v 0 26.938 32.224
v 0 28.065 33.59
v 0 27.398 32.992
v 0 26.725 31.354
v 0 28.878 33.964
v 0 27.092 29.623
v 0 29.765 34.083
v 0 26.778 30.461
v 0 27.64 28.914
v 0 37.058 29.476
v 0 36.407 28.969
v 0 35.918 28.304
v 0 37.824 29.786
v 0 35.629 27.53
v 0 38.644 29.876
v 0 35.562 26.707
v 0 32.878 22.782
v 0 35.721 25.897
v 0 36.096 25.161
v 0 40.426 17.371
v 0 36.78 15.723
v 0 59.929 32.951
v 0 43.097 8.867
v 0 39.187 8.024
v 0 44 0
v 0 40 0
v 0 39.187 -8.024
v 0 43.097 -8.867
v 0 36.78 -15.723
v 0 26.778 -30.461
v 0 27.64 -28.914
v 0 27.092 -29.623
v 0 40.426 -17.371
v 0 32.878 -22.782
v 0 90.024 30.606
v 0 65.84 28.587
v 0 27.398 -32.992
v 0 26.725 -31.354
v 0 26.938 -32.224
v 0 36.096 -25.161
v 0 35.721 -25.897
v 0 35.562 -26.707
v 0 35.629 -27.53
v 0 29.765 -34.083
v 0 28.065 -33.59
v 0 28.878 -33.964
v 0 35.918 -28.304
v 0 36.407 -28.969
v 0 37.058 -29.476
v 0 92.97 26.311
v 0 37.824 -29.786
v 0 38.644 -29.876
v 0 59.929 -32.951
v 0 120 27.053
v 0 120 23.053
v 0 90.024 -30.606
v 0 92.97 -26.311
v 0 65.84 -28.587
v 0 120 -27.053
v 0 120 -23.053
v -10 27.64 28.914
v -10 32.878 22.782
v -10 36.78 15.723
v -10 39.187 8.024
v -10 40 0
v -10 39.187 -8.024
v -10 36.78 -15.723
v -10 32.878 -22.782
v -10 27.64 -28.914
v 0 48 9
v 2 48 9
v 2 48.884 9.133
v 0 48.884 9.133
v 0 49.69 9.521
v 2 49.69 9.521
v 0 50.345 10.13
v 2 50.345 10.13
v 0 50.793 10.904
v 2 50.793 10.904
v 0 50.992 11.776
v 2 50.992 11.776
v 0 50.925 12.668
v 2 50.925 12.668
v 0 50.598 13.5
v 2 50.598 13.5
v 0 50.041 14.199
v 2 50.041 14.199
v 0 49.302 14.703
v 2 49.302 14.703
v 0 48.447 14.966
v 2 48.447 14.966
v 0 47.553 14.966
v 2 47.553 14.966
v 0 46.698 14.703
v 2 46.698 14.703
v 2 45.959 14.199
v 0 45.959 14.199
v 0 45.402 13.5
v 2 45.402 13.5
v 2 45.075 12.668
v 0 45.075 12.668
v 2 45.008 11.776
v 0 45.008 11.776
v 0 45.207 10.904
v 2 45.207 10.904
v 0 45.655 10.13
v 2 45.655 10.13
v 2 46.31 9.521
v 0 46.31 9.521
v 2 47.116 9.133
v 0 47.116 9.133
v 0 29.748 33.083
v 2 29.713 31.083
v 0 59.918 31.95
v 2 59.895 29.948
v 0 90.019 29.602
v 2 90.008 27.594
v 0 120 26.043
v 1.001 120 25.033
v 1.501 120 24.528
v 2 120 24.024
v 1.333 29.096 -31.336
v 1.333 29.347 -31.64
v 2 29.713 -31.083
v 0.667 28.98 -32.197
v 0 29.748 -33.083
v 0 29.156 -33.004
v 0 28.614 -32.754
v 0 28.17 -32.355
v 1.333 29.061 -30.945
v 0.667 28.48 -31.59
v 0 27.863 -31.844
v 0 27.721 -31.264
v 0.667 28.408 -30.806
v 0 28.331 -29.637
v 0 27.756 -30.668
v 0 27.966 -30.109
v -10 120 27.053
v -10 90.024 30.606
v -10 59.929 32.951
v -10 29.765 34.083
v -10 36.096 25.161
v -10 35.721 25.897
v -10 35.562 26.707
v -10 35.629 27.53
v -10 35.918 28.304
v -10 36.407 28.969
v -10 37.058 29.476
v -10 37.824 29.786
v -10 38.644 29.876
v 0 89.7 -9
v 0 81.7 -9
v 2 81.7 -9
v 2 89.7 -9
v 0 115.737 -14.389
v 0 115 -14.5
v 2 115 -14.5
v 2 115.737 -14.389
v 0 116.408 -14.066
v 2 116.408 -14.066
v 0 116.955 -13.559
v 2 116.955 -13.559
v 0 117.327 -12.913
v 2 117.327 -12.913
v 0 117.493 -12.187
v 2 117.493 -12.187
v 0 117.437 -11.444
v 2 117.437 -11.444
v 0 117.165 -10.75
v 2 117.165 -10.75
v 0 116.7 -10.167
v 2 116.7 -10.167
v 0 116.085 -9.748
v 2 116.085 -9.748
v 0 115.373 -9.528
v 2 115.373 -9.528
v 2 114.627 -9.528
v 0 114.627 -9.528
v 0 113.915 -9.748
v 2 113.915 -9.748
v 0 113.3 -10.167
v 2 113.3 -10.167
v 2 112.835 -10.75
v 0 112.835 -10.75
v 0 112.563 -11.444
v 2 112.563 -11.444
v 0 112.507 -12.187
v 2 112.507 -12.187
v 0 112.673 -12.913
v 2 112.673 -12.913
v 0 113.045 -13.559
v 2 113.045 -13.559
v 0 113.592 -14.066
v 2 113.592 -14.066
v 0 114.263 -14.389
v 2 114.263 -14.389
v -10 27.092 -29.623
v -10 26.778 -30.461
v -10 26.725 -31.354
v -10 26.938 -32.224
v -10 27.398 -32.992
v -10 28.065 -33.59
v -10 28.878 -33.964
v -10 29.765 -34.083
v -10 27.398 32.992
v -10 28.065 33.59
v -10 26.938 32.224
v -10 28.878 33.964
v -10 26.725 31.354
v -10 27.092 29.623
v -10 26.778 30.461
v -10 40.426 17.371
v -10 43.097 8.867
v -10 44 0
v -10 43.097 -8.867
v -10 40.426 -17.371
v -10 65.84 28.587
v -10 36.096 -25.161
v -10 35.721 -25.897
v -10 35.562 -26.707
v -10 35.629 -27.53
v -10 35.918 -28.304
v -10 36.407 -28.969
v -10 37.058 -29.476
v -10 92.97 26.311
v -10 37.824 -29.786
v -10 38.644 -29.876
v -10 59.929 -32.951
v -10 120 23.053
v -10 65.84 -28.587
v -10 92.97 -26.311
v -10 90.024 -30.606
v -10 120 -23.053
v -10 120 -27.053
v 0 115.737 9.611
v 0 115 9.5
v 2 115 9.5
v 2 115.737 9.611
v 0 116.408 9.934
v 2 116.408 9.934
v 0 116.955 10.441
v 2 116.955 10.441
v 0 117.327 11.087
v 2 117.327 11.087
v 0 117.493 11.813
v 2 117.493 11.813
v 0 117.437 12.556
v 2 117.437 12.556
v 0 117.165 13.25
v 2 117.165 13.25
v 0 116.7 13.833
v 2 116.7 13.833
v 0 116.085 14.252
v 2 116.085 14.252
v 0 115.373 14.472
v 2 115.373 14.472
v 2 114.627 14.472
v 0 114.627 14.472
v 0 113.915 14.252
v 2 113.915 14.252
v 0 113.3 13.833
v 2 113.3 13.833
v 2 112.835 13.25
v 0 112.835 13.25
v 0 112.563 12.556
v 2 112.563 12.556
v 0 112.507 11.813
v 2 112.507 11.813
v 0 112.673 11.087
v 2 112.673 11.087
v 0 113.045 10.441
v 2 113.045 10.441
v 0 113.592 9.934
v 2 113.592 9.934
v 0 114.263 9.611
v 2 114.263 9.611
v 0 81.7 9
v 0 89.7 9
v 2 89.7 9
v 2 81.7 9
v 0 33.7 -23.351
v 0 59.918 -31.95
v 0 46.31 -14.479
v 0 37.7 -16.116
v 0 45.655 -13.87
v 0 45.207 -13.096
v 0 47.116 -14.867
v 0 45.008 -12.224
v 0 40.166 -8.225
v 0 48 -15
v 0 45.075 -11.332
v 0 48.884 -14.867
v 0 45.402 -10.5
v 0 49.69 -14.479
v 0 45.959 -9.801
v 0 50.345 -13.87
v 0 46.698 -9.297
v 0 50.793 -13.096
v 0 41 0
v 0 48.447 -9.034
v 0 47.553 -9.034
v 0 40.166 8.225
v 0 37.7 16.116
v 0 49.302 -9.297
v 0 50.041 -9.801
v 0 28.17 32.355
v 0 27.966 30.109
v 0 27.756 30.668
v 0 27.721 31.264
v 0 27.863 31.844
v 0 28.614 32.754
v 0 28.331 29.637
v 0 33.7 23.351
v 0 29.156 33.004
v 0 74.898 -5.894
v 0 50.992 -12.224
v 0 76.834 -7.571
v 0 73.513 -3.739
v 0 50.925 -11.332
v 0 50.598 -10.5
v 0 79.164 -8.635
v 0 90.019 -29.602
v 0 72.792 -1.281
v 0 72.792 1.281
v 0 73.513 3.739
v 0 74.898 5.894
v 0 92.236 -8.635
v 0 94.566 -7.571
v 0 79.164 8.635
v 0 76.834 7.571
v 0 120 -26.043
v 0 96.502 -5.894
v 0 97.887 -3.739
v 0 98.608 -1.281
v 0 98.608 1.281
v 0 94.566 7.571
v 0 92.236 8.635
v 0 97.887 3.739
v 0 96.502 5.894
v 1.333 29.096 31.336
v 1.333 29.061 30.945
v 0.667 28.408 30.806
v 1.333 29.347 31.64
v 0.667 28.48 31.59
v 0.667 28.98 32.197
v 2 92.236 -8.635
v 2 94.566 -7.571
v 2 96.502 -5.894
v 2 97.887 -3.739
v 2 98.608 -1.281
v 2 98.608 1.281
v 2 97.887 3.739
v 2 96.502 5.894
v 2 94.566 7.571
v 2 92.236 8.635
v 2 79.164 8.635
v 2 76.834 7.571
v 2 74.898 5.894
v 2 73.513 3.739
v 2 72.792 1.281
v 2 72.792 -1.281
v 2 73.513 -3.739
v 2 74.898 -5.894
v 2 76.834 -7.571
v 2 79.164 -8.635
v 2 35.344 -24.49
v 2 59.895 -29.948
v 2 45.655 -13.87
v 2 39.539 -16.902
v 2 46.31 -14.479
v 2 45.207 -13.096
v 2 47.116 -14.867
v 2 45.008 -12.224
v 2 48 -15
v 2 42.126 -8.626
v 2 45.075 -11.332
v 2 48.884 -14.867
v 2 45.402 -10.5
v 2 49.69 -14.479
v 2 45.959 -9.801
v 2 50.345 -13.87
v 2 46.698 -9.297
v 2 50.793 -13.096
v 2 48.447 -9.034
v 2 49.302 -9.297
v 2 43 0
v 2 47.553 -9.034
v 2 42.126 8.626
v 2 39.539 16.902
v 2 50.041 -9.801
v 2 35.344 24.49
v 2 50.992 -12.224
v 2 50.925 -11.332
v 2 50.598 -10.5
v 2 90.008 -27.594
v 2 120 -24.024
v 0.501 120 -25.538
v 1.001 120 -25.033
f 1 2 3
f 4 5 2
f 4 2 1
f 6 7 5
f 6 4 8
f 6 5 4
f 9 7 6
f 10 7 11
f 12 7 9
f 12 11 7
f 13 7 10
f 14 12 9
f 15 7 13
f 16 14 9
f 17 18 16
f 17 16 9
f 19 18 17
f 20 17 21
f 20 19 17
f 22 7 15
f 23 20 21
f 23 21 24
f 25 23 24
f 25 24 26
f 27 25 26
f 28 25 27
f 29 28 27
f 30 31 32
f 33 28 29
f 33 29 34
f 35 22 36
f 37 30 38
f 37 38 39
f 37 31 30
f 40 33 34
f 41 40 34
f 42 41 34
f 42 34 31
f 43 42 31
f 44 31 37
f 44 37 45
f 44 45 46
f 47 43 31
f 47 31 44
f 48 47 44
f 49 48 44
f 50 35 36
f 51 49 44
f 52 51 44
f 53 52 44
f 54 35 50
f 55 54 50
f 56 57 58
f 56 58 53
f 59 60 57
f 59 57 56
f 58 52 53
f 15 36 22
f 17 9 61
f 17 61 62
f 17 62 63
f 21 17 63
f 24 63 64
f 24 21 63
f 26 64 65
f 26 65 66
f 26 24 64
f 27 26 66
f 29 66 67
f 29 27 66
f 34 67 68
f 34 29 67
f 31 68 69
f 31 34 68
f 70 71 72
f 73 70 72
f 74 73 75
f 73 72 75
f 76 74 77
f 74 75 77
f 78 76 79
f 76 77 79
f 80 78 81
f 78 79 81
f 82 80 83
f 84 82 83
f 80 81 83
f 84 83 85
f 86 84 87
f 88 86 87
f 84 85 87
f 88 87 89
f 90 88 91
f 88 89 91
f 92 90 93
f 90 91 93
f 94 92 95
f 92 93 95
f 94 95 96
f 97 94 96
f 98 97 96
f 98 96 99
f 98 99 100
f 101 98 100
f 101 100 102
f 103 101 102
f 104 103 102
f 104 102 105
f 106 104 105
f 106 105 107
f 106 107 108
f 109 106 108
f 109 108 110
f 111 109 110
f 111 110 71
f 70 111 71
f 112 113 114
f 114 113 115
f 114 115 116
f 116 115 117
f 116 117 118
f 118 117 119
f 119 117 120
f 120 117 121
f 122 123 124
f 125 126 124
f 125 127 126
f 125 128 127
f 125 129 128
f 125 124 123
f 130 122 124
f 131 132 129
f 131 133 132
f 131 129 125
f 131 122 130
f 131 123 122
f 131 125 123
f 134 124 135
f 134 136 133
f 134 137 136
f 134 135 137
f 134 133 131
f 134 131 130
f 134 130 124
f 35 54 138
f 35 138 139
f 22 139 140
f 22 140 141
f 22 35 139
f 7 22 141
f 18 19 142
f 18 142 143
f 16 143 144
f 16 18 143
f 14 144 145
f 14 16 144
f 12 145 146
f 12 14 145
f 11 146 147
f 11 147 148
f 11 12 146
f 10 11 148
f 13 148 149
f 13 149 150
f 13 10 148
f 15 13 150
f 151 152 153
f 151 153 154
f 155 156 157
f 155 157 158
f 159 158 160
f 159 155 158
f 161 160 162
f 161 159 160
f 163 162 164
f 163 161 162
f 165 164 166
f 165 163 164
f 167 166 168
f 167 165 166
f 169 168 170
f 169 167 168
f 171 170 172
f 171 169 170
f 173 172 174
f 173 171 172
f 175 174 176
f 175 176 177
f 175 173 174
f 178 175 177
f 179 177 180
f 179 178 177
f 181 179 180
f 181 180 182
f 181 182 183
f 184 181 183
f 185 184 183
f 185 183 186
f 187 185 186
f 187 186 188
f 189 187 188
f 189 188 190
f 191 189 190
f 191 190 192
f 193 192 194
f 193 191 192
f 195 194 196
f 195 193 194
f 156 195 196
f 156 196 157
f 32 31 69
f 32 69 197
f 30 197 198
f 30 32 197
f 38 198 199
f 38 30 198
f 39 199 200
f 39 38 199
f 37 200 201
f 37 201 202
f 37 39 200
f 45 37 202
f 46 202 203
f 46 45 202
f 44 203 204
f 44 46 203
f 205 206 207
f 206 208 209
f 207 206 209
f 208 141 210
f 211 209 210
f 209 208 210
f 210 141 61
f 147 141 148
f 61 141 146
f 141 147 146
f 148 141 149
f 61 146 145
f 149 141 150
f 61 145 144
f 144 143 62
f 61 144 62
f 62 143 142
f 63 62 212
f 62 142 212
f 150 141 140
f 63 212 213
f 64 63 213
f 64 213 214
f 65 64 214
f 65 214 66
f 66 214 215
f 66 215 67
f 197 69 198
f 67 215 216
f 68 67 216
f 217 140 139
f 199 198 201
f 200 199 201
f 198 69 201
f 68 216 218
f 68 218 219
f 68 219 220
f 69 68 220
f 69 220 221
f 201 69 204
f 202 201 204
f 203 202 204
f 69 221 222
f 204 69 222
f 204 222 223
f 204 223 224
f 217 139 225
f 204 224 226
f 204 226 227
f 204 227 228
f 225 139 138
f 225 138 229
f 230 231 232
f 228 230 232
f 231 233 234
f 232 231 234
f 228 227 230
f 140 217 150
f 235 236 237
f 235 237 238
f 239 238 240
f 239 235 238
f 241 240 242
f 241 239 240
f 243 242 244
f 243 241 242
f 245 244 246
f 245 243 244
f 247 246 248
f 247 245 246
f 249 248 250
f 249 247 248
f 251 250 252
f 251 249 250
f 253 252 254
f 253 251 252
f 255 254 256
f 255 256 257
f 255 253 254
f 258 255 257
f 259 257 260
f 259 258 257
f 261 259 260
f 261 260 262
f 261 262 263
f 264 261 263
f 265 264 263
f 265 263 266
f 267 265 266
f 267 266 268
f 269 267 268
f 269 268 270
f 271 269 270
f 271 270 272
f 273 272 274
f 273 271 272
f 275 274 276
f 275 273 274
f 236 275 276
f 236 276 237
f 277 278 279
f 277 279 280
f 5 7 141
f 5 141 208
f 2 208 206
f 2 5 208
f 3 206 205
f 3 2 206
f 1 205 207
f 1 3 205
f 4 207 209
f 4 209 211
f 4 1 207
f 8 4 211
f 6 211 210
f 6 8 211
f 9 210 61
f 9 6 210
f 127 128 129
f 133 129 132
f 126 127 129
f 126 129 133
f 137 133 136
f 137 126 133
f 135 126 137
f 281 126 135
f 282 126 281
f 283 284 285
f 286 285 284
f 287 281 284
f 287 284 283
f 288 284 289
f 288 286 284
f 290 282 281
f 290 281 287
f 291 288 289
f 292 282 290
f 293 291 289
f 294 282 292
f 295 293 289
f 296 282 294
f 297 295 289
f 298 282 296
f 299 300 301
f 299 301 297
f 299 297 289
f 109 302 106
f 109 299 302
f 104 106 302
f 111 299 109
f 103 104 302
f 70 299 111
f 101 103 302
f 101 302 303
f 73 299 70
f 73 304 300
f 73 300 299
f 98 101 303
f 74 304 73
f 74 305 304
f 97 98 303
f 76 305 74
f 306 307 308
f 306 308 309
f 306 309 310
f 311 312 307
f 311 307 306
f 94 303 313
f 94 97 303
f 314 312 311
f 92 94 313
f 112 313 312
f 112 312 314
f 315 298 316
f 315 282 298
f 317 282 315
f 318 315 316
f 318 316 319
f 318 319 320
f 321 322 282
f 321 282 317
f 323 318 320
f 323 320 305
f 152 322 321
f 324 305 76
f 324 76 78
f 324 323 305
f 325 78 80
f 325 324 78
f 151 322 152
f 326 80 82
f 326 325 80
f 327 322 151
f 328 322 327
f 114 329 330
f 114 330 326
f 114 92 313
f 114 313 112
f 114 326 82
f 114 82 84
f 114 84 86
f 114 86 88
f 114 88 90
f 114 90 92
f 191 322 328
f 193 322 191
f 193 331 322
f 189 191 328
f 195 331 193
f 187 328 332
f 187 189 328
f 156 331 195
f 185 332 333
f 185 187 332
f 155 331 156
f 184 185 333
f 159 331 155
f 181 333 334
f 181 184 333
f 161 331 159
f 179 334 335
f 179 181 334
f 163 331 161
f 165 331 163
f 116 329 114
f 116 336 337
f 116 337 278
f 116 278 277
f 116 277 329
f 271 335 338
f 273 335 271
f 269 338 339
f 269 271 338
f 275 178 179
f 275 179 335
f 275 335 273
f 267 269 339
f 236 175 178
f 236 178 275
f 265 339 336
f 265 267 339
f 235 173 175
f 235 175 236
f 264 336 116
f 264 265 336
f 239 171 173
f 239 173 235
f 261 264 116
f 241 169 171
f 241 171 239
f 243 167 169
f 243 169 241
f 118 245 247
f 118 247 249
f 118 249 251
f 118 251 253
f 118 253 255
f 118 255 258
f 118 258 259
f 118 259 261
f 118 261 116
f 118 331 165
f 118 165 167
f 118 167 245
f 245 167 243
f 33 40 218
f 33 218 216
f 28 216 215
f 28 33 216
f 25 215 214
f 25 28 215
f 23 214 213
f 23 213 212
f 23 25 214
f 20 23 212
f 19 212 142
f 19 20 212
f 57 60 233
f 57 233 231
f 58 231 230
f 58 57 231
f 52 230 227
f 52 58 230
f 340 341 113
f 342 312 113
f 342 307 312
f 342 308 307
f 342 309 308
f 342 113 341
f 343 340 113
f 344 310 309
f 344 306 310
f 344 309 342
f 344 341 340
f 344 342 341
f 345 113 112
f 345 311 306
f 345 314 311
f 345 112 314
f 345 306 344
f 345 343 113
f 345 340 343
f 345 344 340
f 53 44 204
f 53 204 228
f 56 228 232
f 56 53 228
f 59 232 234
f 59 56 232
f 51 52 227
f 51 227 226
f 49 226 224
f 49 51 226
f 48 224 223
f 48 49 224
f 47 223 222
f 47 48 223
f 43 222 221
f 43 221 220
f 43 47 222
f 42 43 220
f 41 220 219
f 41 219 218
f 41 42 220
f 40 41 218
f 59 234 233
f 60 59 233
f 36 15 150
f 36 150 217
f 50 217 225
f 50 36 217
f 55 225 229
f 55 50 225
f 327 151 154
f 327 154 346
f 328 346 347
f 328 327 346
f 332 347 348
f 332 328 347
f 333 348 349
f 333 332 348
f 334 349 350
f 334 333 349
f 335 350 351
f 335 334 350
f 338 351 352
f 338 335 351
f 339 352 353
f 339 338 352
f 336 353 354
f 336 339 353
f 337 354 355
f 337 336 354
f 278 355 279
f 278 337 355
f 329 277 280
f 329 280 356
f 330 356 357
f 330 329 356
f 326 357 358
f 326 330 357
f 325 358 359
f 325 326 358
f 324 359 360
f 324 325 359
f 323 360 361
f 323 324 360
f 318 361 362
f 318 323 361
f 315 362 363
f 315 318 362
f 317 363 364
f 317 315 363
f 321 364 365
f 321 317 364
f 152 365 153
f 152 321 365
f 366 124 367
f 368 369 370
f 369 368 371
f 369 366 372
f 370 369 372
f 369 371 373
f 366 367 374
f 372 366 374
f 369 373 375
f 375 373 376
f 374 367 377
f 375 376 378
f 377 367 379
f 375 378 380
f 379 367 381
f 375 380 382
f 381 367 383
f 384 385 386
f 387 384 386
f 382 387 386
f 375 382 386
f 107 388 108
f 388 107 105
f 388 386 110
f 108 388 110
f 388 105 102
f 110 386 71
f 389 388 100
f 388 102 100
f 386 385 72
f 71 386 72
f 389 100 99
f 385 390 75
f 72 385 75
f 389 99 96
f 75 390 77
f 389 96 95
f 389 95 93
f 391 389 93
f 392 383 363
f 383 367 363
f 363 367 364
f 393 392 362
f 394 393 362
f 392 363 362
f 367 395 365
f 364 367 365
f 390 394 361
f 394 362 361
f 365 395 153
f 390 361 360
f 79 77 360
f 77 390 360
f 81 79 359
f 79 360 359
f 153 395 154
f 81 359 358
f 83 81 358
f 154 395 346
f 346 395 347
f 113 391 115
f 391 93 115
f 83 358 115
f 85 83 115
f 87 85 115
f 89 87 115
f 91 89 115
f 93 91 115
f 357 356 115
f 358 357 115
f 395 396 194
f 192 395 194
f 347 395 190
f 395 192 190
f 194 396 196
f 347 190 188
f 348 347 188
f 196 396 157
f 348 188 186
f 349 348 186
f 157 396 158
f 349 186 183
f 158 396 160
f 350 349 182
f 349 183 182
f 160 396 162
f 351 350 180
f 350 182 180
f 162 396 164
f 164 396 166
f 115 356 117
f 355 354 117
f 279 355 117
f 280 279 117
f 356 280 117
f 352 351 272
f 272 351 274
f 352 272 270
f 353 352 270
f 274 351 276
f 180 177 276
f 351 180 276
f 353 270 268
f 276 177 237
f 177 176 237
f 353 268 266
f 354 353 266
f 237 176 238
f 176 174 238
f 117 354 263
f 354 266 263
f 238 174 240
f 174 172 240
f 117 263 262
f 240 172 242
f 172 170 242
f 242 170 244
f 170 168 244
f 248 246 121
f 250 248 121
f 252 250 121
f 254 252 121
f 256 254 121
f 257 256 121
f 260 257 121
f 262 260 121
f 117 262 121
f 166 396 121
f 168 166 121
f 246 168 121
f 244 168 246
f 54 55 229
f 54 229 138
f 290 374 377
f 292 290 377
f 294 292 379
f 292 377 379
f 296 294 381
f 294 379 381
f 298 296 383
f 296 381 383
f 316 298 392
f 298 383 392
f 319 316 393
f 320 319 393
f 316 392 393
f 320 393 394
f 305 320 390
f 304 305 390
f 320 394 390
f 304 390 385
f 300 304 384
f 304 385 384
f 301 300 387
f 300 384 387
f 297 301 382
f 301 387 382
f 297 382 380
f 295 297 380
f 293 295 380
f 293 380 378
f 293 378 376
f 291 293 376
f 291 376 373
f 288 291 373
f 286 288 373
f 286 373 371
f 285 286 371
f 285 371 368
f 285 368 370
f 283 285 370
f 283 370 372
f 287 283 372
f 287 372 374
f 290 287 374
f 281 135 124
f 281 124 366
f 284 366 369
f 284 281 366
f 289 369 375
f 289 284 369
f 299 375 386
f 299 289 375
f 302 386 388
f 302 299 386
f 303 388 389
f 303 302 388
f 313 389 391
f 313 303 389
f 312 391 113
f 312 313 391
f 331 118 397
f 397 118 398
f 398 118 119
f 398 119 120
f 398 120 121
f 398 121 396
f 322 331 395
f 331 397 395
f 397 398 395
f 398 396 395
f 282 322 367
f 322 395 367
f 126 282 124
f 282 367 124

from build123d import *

# Parameters (mm, degrees)
SKETCH1_R           = 2.5
BOSS_EXTRUDE1_DEPTH = 2
CUT_EXTRUDE1_DEPTH  = 2
BOSS_EXTRUDE3_DEPTH = 10
SKETCH5_R           = 3
CUT_EXTRUDE2_DEPTH  = 10
CHAMFER4_SIZE       = 3


with BuildPart() as part:
    # Sketch1 → Boss-Extrude1 (new body)
    with BuildSketch(Plane(origin=(0, 0, 0), x_dir=(0, 0, -1), z_dir=(1, 0, 0))):
        with BuildLine():
            Line((-27.052882521, 120), (27.052882521, 120))
            ThreePointArc((27.052882521, 120), (31.930110278, 74.988584163), (34.08250741, 29.764894653))
            ThreePointArc((34.08250741, 29.764894653), (32.223851782, 26.938192137), (28.914381406, 27.63980007))
            ThreePointArc((28.914381406, 27.63980007), (0, 40), (-28.914381406, 27.63980007))
            ThreePointArc((-28.914381406, 27.63980007), (-32.223851782, 26.938192137), (-34.08250741, 29.764894653))
            ThreePointArc((-34.08250741, 29.764894653), (-31.930110278, 74.988584163), (-27.052882521, 120))
        make_face()
        with Locations((-12, 115)):
            Circle(SKETCH1_R, mode=Mode.SUBTRACT)
        with Locations((12, 115)):
            Circle(SKETCH1_R, mode=Mode.SUBTRACT)
    extrude(amount=BOSS_EXTRUDE1_DEPTH)

    # Sketch2 → Cut-Extrude1 (cut)
    with BuildSketch(Plane.ZY):
        with BuildLine():
            Line((9, 89.7), (9, 81.7))
            ThreePointArc((9, 81.7), (0, 72.7), (-9, 81.7))
            Line((-9, 81.7), (-9, 89.7))
            ThreePointArc((-9, 89.7), (0, 98.7), (9, 89.7))
        make_face()
    extrude(amount=-CUT_EXTRUDE1_DEPTH, mode=Mode.SUBTRACT)

    # Sketch5 → Cut-Extrude2 (cut)
    with BuildSketch(Plane(origin=(2, 0, 0), x_dir=(0, 0, -1), z_dir=(1, 0, 0))):
        with Locations((-12, 48)):
            Circle(SKETCH5_R)
        with Locations((12, 48)):
            Circle(SKETCH5_R)
    extrude(amount=-CUT_EXTRUDE2_DEPTH, mode=Mode.SUBTRACT)

    # Chamfer4
    # the kernel refuses this chamfer: 3 mm, written as the material it takes off along each edge
    with BuildSketch(Plane(origin=(2, 16.7375, 715.804342047), x_dir=(0, 0.14786465744034102, -0.9890076051679535), z_dir=(0, 0.9890076051679535, 0.14786465744034102))) as chamfer4_piece_1:
        Polygon((750, CHAMFER4_SIZE), (750 - CHAMFER4_SIZE, 0), (750, 0), align=None)
    revolve(axis=Axis((2, 16.7375, 715.804342047), (-1, 0, 0)), revolution_arc=7.507930855, mode=Mode.SUBTRACT)
    with BuildSketch(Plane(origin=(2, 29.712785075, -31.082960012), x_dir=(0, 0.01736985953789309, -0.9998491326093322), z_dir=(0, 0.9998491326093322, 0.01736985953789309))) as chamfer4_piece_2:
        Polygon((3 - CHAMFER4_SIZE, 0), (3, CHAMFER4_SIZE), (3, 0), align=None)
    revolve(axis=Axis((2, 29.712785075, -31.082960012), (-1, 0, 0)), revolution_arc=137.286346121, mode=Mode.SUBTRACT)
    with BuildSketch(Plane(origin=(2, 0, 0), x_dir=(0, 0.6909950017388863, -0.7228595351601006), z_dir=(0, -0.7228595351601006, -0.6909950017388863))) as chamfer4_piece_3:
        Polygon((40 + CHAMFER4_SIZE, 0), (40, -CHAMFER4_SIZE), (40, 0), align=None)
    revolve(axis=Axis((2, 0, 0), (1, 0, 0)), revolution_arc=92.582152855, mode=Mode.SUBTRACT)
    with BuildSketch(Plane(origin=(2, 29.712785075, 31.082960012), x_dir=(0, -0.6909950017388667, -0.7228595351601192), z_dir=(0, 0.7228595351601192, -0.6909950017388667))) as chamfer4_piece_4:
        Polygon((3 - CHAMFER4_SIZE, 0), (3, CHAMFER4_SIZE), (3, 0), align=None)
    revolve(axis=Axis((2, 29.712785075, 31.082960012), (-1, 0, 0)), revolution_arc=137.286346121, mode=Mode.SUBTRACT)
    with BuildSketch(Plane(origin=(2, 16.7375, -715.804342047), x_dir=(0, 0.017369859537853687, 0.9998491326093328), z_dir=(0, -0.9998491326093328, 0.017369859537853687))) as chamfer4_piece_5:
        Polygon((750, CHAMFER4_SIZE), (750 - CHAMFER4_SIZE, 0), (750, 0), align=None)
    revolve(axis=Axis((2, 16.7375, -715.804342047), (-1, 0, 0)), revolution_arc=7.507930855, mode=Mode.SUBTRACT)


with BuildPart() as body_2:
    # Sketch4 → Boss-Extrude3 (new body)
    with BuildSketch(Plane.ZY):
        with BuildLine():
            Line((-27.052882521, 120), (-23.052882521, 120))
            ThreePointArc((-23.052882521, 120), (-27.572077693, 79.415145268), (-29.875645827, 38.644480171))
            ThreePointArc((-29.875645827, 38.644480171), (-28.303672095, 35.917838187), (-25.161377416, 36.095776575))
            ThreePointArc((-25.161377416, 36.095776575), (0, 44), (25.161377416, 36.095776575))
            ThreePointArc((25.161377416, 36.095776575), (28.303672095, 35.917838187), (29.875645827, 38.644480171))
            ThreePointArc((29.875645827, 38.644480171), (27.572077693, 79.415145268), (23.052882521, 120))
            Line((23.052882521, 120), (27.052882521, 120))
            ThreePointArc((27.052882521, 120), (31.930110278, 74.988584163), (34.08250741, 29.764894653))
            ThreePointArc((34.08250741, 29.764894653), (32.223851782, 26.938192137), (28.914381406, 27.63980007))
            ThreePointArc((28.914381406, 27.63980007), (0, 40), (-28.914381406, 27.63980007))
            ThreePointArc((-28.914381406, 27.63980007), (-32.223851782, 26.938192137), (-34.08250741, 29.764894653))
            ThreePointArc((-34.08250741, 29.764894653), (-31.930110278, 74.988584163), (-27.052882521, 120))
        make_face()
    extrude(amount=BOSS_EXTRUDE3_DEPTH)


solid = Compound([part.part, body_2.part])
